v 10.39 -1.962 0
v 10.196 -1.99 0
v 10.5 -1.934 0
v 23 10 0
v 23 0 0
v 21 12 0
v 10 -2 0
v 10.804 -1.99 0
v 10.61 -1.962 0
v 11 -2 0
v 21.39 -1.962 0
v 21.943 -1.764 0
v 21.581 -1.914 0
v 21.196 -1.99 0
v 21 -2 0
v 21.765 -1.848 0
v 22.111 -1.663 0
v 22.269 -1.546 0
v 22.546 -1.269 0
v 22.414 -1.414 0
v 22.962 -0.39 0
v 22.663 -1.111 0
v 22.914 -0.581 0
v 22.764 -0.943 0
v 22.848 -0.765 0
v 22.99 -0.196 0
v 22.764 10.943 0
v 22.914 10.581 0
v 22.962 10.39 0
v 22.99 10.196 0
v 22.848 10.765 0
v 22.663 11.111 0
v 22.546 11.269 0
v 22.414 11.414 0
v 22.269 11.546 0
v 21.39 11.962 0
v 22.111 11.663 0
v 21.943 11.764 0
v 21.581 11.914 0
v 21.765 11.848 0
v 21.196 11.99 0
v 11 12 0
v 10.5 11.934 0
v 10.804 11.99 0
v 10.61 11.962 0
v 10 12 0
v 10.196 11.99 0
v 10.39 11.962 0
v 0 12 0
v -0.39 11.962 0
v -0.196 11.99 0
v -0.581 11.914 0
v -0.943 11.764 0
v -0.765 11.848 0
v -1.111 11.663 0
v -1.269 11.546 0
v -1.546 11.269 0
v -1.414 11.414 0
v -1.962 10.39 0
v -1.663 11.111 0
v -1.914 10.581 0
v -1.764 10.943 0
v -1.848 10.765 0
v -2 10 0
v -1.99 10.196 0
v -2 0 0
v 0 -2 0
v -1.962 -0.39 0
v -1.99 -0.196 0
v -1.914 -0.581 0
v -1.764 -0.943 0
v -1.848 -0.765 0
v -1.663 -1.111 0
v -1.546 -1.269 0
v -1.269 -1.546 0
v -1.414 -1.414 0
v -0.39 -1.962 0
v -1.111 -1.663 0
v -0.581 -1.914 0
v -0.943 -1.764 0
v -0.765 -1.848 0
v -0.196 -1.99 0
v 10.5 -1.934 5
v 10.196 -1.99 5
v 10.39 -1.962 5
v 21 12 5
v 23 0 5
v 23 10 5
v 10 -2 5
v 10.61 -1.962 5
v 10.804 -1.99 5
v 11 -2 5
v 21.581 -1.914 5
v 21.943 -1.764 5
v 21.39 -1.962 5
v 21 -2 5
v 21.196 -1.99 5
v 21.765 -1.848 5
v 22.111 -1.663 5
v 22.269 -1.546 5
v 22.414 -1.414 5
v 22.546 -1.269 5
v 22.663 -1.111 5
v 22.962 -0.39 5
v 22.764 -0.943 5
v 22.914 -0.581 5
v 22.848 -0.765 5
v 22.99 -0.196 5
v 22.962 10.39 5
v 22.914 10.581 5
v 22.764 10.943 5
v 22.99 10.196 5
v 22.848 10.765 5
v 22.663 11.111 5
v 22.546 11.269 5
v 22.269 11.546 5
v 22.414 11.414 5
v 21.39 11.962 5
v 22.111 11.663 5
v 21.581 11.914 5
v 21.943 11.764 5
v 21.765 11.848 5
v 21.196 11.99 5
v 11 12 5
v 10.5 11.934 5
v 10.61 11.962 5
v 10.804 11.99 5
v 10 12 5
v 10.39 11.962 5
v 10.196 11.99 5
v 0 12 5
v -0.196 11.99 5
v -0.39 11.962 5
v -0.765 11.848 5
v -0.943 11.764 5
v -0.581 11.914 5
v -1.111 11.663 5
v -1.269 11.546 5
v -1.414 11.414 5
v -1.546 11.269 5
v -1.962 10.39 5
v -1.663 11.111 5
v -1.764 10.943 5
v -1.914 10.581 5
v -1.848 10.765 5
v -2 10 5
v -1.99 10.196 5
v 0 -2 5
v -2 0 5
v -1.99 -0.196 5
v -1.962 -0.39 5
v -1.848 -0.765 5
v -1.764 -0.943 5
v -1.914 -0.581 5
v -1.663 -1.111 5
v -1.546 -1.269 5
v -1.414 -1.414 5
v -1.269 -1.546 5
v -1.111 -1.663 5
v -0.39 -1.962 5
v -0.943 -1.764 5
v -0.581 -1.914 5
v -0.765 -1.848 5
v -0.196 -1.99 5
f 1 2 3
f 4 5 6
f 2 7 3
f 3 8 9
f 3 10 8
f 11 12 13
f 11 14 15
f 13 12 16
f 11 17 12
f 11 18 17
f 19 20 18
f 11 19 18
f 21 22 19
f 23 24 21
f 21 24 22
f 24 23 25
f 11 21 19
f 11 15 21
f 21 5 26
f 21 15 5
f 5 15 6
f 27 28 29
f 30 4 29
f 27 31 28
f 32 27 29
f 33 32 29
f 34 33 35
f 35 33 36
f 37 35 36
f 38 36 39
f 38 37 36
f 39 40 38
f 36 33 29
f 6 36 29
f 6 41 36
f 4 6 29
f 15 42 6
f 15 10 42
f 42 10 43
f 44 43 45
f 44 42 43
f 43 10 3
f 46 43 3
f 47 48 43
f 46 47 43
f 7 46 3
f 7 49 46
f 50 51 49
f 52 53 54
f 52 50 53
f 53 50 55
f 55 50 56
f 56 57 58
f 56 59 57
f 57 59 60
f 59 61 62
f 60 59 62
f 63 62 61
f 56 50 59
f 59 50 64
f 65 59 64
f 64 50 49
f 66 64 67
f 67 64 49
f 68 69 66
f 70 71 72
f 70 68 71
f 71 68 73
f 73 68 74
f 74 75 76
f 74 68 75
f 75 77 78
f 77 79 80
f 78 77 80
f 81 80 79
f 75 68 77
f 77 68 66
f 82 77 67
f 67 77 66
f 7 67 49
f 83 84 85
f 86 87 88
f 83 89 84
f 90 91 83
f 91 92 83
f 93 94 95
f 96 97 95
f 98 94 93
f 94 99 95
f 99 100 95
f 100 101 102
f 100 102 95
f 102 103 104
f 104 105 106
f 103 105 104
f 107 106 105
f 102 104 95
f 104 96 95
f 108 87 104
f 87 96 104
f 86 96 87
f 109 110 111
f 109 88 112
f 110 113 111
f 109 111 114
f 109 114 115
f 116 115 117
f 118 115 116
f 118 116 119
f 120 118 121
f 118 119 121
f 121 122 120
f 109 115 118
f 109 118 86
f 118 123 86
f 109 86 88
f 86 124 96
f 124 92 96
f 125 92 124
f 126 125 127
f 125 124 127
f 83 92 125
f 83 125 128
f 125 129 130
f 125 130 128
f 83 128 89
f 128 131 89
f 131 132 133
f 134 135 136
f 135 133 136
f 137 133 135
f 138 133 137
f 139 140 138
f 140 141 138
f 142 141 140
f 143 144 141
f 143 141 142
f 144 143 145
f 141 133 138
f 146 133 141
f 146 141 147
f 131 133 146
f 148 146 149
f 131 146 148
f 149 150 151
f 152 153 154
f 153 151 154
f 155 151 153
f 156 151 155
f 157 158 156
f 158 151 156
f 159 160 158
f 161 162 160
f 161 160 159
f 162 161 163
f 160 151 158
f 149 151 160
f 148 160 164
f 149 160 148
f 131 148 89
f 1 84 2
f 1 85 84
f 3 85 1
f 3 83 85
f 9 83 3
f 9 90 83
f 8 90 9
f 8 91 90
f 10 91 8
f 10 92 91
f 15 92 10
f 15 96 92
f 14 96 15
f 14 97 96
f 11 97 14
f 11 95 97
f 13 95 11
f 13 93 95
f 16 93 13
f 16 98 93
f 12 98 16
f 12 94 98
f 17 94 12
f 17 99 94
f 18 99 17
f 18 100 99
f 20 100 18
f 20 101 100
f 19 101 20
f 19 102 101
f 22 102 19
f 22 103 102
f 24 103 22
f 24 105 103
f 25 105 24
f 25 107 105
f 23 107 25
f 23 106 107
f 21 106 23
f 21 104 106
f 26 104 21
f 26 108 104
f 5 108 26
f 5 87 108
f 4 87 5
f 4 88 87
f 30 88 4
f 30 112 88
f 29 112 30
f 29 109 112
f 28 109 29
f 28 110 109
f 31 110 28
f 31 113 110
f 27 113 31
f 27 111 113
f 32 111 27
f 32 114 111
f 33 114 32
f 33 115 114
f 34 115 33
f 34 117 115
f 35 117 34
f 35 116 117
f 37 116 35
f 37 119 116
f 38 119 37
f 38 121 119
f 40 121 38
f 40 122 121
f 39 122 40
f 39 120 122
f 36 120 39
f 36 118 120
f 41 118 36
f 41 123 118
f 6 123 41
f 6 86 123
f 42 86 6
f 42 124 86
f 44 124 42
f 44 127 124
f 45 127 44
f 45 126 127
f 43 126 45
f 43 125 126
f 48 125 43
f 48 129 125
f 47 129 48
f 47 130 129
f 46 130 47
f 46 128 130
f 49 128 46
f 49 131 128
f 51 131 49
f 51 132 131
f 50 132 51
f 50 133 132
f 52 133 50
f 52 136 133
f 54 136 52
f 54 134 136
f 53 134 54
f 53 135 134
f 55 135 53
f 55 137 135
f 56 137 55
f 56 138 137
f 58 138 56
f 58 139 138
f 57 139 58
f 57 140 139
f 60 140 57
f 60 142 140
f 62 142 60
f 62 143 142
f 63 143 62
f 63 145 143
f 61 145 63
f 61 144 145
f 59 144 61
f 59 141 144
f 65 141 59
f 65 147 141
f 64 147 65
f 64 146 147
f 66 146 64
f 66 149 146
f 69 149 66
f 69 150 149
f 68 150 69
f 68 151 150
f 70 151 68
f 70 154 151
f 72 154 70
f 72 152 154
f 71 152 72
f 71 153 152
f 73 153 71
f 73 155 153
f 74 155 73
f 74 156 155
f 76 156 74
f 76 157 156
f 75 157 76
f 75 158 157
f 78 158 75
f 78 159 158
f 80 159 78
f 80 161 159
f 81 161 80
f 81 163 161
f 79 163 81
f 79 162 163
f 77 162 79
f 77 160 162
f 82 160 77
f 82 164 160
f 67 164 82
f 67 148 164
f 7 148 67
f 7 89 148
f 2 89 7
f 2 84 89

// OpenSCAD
// offset() grows its children as one region: two squares 1 mm apart, grown 2 mm, run into each other and are one
// outline. build123d's offset grows each face on its own; unfused, the two grown faces overlapped and their extrude
// was two solids over the same space — as Thingiverse 745296's letters grown into each other, 36% short after the union
$fn = 64;
linear_extrude(height = 5) offset(r = 2) {
    square(10);
    translate([11, 0]) square(10);
}
